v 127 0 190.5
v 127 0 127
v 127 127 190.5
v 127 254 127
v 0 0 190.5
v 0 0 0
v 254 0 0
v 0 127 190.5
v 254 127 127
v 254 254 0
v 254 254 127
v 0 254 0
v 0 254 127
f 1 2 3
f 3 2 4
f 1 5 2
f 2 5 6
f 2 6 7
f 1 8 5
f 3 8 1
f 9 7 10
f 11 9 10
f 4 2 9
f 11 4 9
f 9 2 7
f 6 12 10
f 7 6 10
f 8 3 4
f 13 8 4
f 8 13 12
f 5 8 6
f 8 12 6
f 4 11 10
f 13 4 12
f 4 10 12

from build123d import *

# Parameters (mm, degrees)
F0_W     = 127
F0_H     = 127
F1_DEPTH = 190.5
F2_DEPTH = 127
F4_DEPTH = 127
F8_DEPTH = 76.2


with BuildPart() as f1:
    # F0 (on Top) → F1 (new body)
    with BuildSketch(Plane.XY):
        with Locations((63.5, 63.5)):
            Rectangle(F0_W, F0_H)
        with Locations((63.5, 190.5)):
            Rectangle(F0_W, F0_H)
    extrude(amount=F1_DEPTH)

    # F0 (on Top) → F2 (join)
    with BuildSketch(Plane.XY):
        Polygon((127, 127), (127, 0), (254, 127), (254, 254), (127, 254), align=None)
        Polygon((254, 127), (127, 0), (254, 0), align=None)
    extrude(amount=F2_DEPTH)

    # F3 (on face) → F4 (cut)
    with BuildSketch(Plane.YZ.offset(127)):
        Polygon((254, 190.5), (127, 190.5), (254, 127), align=None)
    extrude(amount=-F4_DEPTH, mode=Mode.SUBTRACT)

    # F7 (on 3pt) → F8 (cut)
    with BuildSketch(Plane(origin=(84.6666666667, -84.6666666667, 84.6666666667), x_dir=(0.8164965809, 0.4082482905, -0.4082482905), z_dir=(0.5773502692, -0.5773502692, 0.5773502692))):
        Polygon((207.3901315556, 0), (207.3901315556, 179.6051224214), (51.8475328889, 89.8025612107), align=None)
    extrude(amount=F8_DEPTH, mode=Mode.SUBTRACT)


solid = f1.part
